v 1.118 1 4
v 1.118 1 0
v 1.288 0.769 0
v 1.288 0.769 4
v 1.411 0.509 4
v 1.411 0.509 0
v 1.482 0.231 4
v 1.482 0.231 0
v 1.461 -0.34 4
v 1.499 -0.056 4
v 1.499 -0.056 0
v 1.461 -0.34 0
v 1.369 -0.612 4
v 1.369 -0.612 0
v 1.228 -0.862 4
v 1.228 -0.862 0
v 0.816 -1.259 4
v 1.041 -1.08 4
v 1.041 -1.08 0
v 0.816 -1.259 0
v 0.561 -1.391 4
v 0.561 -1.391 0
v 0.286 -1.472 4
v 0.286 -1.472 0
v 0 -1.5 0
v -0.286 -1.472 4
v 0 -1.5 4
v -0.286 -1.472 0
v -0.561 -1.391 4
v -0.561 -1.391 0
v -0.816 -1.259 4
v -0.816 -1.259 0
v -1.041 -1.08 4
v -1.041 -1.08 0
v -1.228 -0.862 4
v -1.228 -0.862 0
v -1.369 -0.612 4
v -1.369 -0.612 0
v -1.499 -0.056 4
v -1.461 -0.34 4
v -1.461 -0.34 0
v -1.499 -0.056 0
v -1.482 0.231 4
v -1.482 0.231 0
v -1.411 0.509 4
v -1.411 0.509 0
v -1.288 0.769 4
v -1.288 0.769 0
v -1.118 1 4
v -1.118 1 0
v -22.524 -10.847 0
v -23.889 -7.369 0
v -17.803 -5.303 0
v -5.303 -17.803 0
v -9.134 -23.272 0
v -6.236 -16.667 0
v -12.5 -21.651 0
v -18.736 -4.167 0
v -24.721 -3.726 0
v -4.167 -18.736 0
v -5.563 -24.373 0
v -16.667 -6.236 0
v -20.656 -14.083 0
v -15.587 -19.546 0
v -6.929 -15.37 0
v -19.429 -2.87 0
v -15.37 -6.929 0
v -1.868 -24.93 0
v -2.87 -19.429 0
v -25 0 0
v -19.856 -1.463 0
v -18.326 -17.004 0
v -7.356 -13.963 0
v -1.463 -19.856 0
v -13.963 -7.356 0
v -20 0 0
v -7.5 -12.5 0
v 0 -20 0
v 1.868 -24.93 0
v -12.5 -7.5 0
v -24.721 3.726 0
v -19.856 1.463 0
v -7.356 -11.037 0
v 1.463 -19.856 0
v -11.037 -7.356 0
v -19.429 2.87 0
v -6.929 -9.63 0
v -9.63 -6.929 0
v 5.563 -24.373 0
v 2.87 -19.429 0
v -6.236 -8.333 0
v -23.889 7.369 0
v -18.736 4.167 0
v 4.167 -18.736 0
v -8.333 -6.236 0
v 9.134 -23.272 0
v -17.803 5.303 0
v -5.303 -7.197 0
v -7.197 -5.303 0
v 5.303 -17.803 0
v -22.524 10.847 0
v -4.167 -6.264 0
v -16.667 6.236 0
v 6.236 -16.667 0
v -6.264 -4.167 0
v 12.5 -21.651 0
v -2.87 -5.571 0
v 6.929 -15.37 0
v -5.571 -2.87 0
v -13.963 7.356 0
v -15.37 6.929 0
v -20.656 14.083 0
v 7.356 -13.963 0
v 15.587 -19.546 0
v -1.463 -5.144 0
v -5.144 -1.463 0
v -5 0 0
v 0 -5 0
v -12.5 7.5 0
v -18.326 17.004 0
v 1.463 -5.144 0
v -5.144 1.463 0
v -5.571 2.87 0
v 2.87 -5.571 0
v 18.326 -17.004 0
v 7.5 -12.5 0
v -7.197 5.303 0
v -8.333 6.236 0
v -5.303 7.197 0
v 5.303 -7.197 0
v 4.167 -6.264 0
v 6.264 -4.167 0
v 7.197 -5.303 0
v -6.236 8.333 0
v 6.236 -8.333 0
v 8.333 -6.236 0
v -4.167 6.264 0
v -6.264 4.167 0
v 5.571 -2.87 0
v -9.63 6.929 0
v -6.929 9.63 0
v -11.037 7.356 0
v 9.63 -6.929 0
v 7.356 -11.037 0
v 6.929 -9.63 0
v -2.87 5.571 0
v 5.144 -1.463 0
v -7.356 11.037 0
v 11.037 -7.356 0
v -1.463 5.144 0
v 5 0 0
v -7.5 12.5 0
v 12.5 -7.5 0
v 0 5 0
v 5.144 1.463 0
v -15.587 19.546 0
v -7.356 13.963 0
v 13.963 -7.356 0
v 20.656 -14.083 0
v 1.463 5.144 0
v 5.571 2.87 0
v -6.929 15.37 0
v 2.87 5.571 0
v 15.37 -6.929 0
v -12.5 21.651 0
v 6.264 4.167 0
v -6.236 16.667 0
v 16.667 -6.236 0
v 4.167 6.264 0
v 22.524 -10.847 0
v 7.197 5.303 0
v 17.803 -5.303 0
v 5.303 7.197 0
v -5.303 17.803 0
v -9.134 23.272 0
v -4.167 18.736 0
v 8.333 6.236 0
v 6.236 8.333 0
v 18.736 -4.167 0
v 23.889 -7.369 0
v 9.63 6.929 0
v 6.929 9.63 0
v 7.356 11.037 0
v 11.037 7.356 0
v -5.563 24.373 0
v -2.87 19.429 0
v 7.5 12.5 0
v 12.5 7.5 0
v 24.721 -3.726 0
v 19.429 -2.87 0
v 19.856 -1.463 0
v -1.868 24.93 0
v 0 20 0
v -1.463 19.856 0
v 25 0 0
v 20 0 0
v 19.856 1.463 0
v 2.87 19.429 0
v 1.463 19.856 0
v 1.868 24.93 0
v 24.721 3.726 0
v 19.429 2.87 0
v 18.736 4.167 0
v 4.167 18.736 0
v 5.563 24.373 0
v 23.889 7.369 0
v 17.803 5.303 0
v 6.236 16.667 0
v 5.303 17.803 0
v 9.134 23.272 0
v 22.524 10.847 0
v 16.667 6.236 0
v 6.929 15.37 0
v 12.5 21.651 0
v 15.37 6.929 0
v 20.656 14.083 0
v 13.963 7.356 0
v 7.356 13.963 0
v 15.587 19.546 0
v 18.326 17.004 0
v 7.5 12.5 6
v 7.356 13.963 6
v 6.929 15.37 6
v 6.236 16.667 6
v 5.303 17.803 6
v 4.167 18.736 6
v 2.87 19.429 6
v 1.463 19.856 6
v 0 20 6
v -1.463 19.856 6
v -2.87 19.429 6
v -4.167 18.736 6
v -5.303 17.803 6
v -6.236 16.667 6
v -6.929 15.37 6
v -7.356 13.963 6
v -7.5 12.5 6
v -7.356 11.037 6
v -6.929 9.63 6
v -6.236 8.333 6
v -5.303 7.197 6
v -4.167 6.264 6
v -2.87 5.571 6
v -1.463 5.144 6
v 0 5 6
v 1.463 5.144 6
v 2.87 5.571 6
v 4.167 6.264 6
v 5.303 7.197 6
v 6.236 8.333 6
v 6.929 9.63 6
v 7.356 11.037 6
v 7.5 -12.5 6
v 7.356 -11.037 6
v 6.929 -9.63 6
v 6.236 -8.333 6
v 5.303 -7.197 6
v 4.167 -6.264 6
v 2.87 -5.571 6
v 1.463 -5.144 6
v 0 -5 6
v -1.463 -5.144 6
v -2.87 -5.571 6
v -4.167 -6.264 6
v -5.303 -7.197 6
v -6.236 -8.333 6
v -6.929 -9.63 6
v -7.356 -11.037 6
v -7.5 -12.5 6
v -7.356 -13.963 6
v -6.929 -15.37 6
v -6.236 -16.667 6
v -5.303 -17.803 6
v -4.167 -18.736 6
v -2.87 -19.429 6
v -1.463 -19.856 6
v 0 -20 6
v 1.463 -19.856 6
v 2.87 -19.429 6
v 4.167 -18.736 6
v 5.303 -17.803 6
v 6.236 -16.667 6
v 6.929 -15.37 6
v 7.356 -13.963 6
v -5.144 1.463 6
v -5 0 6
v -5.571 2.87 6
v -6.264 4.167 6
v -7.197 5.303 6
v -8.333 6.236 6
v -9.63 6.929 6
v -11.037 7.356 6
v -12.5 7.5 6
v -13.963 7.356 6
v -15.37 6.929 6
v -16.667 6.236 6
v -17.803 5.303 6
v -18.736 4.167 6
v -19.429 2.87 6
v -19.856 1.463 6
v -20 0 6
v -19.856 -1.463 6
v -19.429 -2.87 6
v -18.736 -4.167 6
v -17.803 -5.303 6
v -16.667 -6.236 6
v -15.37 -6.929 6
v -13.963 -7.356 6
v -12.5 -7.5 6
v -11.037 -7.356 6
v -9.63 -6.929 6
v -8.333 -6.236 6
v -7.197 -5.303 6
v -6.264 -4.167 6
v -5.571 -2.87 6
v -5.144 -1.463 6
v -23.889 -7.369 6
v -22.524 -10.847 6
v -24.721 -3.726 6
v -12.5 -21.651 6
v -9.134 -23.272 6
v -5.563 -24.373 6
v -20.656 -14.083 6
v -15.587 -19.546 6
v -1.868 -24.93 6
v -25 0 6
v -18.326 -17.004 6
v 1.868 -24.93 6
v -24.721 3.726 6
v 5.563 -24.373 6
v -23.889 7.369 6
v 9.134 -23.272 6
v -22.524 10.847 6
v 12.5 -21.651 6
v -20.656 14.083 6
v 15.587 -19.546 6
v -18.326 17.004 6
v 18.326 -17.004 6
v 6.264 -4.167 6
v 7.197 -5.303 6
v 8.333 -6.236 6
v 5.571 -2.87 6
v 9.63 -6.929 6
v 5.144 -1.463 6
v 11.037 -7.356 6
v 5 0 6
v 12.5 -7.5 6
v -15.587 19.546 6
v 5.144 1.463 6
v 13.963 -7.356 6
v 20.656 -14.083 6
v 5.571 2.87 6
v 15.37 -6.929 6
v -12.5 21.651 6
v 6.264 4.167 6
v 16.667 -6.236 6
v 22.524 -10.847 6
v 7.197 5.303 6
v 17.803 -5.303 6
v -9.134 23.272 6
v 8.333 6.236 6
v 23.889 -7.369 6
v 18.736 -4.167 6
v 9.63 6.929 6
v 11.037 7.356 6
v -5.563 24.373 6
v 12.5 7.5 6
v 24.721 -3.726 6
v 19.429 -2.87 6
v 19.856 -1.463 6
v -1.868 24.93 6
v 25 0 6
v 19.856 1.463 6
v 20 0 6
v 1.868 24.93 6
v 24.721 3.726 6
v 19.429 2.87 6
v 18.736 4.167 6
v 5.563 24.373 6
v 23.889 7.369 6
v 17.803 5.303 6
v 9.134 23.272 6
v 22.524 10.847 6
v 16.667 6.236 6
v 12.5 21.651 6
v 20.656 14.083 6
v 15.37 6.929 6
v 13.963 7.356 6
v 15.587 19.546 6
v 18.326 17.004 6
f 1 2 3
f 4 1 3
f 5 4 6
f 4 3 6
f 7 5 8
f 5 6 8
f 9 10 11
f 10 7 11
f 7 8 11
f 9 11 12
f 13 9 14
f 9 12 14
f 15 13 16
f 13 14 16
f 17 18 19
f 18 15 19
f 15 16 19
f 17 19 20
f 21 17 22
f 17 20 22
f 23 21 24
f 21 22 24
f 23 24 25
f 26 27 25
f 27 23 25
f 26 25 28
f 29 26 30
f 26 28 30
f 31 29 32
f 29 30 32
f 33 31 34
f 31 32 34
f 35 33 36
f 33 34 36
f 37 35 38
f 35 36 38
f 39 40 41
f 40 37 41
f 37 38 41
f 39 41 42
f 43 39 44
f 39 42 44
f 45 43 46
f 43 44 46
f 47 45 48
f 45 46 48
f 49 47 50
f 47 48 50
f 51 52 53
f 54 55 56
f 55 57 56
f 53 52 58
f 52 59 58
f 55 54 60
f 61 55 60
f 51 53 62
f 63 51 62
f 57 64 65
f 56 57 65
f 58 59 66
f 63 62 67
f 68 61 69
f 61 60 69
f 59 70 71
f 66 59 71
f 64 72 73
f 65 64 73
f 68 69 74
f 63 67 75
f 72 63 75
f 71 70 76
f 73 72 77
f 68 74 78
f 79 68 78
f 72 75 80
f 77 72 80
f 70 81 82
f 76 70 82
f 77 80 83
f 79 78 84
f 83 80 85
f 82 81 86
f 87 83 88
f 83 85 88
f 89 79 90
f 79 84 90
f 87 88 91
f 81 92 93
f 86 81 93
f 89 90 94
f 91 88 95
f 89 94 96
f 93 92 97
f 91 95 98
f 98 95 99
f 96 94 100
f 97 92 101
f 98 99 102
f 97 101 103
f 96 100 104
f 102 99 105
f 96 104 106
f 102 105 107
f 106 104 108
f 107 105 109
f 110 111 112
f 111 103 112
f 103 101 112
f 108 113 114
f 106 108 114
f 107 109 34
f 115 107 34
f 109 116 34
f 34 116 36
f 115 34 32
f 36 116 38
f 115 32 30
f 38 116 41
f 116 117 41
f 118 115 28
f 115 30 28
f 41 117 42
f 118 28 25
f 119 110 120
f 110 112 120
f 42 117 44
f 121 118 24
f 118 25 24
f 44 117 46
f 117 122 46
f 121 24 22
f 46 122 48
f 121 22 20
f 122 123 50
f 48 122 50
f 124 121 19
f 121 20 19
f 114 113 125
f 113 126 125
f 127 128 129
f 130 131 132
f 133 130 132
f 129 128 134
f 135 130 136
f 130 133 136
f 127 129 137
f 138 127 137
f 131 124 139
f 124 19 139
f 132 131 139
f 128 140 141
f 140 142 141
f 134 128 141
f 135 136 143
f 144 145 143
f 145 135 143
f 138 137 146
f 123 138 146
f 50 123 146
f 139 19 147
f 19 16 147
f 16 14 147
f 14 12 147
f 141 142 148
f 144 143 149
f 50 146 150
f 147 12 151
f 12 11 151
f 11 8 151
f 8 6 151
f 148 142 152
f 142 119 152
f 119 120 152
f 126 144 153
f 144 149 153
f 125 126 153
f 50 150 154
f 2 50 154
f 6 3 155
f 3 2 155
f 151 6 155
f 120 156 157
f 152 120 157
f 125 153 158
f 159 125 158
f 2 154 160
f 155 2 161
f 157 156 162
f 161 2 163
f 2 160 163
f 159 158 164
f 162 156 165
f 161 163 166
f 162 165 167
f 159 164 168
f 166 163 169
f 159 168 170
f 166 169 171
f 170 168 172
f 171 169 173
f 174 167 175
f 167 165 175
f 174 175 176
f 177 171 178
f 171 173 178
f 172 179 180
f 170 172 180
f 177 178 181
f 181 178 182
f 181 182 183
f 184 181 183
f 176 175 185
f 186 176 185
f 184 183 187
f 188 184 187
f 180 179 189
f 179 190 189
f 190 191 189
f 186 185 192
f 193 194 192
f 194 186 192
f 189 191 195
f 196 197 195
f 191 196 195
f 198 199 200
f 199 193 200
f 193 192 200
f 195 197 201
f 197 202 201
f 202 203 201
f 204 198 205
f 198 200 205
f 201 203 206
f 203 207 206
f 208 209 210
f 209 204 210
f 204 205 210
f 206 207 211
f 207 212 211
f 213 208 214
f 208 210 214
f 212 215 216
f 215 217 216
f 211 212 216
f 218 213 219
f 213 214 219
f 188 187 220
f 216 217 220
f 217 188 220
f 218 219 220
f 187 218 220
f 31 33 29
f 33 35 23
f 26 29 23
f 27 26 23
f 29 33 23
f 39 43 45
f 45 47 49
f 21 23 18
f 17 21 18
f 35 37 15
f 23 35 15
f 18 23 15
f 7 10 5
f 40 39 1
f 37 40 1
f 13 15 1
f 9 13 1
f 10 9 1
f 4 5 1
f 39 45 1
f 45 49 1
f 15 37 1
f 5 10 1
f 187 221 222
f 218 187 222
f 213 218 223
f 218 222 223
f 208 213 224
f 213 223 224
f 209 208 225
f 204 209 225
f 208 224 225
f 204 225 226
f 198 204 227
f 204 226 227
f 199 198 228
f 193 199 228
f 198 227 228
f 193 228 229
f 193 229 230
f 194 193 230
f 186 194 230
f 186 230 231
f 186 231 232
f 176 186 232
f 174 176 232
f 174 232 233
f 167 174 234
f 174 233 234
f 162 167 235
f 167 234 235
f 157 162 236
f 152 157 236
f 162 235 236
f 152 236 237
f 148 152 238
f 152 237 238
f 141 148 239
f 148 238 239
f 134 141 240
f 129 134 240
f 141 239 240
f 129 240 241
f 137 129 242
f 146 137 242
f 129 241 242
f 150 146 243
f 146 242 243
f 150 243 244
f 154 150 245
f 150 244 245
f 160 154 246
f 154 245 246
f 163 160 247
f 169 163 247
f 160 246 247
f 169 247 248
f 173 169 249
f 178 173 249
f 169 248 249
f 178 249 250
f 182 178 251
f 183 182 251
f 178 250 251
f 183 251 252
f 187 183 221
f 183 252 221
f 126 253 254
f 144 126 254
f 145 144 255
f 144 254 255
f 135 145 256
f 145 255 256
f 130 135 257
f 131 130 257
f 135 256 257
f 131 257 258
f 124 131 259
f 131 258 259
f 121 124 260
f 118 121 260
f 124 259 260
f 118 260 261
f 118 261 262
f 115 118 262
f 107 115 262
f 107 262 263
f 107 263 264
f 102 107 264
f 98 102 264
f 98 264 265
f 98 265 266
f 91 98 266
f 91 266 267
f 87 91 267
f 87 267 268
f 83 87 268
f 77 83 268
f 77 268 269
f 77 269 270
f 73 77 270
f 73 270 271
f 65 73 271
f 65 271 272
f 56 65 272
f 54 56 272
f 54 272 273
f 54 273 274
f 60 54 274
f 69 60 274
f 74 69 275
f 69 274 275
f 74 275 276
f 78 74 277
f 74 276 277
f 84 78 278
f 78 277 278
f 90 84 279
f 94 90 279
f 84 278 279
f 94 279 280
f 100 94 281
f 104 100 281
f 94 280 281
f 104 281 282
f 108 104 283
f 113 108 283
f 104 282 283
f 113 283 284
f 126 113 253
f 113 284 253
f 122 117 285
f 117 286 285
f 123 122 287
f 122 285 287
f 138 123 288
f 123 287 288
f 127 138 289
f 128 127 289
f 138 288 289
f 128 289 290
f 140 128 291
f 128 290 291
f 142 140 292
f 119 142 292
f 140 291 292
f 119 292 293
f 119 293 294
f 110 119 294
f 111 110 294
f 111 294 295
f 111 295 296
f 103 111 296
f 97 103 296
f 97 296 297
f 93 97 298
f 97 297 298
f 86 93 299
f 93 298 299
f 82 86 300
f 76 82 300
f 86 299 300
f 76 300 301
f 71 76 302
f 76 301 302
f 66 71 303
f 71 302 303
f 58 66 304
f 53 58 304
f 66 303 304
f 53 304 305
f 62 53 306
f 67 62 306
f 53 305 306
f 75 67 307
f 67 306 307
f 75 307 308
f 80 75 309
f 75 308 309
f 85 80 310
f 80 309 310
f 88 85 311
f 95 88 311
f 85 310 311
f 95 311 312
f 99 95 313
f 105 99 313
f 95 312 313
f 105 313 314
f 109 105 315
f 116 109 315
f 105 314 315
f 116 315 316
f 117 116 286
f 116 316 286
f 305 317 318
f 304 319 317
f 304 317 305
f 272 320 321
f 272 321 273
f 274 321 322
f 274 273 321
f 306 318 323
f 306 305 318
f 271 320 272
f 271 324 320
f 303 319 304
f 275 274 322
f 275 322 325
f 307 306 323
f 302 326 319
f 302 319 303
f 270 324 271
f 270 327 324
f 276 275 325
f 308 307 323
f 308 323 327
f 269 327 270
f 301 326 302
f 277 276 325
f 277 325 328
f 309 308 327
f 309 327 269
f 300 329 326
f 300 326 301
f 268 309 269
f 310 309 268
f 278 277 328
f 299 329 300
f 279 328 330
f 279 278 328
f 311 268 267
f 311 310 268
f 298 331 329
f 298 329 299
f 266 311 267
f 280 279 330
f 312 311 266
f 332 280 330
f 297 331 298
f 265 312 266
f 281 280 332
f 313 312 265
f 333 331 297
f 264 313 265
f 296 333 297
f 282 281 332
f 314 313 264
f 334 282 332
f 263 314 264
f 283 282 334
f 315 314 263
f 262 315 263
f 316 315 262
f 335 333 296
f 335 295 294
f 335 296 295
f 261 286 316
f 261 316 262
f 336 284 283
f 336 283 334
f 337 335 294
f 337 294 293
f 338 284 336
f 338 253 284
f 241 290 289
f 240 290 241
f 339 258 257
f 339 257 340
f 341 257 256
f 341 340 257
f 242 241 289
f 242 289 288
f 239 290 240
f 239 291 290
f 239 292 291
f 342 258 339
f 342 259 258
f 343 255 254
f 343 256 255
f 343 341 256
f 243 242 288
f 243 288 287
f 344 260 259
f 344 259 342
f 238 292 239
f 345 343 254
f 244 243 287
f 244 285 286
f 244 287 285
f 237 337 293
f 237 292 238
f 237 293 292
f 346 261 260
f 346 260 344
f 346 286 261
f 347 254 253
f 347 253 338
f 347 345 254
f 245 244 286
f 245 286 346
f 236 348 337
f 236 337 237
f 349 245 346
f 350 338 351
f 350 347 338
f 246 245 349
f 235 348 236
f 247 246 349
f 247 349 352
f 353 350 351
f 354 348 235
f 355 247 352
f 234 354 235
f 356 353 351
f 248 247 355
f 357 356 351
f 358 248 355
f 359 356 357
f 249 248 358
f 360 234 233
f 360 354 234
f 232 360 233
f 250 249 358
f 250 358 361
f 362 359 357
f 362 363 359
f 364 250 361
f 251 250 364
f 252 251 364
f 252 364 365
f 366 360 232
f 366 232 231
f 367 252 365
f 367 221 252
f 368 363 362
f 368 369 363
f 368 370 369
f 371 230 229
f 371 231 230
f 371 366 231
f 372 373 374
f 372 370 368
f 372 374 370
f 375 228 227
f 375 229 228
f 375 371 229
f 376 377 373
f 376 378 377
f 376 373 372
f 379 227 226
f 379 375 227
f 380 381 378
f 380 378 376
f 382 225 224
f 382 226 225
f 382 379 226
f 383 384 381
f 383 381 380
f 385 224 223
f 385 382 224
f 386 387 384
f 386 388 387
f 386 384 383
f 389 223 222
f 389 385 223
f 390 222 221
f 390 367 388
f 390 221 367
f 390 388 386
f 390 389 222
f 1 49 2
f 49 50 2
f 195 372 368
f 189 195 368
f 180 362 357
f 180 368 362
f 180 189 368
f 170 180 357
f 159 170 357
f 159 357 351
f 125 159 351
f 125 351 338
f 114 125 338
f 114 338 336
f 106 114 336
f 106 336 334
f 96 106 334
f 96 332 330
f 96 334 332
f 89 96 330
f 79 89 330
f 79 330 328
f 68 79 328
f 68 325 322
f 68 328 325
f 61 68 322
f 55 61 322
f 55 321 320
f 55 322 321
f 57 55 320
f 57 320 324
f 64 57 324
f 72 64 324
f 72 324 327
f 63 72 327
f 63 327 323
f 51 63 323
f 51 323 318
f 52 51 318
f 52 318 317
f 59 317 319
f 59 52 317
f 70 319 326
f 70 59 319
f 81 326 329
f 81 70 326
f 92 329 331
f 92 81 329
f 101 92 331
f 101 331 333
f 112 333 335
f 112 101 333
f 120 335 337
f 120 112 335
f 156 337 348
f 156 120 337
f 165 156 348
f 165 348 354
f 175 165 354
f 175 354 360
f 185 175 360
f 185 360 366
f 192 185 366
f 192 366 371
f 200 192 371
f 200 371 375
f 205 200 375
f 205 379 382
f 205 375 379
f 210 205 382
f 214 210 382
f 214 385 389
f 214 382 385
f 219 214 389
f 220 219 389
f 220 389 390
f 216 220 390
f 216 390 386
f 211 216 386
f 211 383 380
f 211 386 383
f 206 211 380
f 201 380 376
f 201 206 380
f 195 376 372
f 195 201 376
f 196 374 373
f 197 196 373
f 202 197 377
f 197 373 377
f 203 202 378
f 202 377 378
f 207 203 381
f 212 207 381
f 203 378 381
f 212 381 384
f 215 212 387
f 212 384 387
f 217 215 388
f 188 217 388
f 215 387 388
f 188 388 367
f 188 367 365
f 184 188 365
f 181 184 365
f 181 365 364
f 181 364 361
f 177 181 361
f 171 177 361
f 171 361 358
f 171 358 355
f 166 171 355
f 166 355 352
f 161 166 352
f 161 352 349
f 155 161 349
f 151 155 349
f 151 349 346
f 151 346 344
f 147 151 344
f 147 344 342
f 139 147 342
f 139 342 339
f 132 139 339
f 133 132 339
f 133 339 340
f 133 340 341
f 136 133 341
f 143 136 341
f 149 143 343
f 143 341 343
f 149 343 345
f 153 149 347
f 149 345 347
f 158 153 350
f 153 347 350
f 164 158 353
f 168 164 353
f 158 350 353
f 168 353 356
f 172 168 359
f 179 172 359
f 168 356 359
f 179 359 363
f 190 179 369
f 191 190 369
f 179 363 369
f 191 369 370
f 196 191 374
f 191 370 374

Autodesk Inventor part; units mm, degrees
ref_plane "YZ Plane" through (0, 0, 0) normal (1, 0, 0) x (0, 1, 0)
ref_plane "XZ Plane" through (0, 0, 0) normal (0, 1, 0) x (-1, 0, 0)
ref_plane "XY Plane" through (0, 0, 0) normal (0, 0, 1) x (1, 0, 0)
sketch "Sketch1" plane through (0, 0, 0) normal (0, 0, 1) x (1, 0, 0)
  circle A0 centre (0, 0) radius 25
  arc A1 (-1.118, 1) -> (1.118, 1) centre (0, 0) ccw
  line L0 (0, 1) -> (1.118, 1)
  line L1 (1.118, 1) -> (0, 1)
  line L2 (0, 1) -> (-1.118, 1)
  dimension "d0" = 50
  dimension "d3" = 1
  dimension "d4" = 1.5
  dimension "d5" = 2.2361
  dimension "d6" = 1.118
extrude "Extrusion1" add sketch "Sketch1" along normal blind 4
sketch "Sketch2" plane through (0, 0, 4) normal (0, 0, 1) x (1, 0, 0)
  circle A0 centre (0, 0) radius 25 projected
  circle A1 centre (0, 0) radius 25
extrude "Extrusion2" add sketch "Sketch2" along normal blind 2
sketch "Sketch3" plane through (0, 0, 0) normal (0, 0, -1) x (-1, 0, 0)
  point P0 (0, 0)
sketch "Sketch4" plane through (0, 0, 6) normal (0, 0, 1) x (1, 0, 0)
  circle A0 centre (12.5, 0) radius 7.5
  circle A1 centre (0, 12.5) radius 7.5
  circle A2 centre (-12.5, 0) radius 7.5
  circle A3 centre (0, -12.5) radius 7.5
  point P0 (0, 0)
  dimension "d14" = 15
  dimension "d15" = 12.5
  dimension "d18" = 360
extrude "Extrusion3" cut sketch "Sketch4" against normal through all
properties part number "wheel"
